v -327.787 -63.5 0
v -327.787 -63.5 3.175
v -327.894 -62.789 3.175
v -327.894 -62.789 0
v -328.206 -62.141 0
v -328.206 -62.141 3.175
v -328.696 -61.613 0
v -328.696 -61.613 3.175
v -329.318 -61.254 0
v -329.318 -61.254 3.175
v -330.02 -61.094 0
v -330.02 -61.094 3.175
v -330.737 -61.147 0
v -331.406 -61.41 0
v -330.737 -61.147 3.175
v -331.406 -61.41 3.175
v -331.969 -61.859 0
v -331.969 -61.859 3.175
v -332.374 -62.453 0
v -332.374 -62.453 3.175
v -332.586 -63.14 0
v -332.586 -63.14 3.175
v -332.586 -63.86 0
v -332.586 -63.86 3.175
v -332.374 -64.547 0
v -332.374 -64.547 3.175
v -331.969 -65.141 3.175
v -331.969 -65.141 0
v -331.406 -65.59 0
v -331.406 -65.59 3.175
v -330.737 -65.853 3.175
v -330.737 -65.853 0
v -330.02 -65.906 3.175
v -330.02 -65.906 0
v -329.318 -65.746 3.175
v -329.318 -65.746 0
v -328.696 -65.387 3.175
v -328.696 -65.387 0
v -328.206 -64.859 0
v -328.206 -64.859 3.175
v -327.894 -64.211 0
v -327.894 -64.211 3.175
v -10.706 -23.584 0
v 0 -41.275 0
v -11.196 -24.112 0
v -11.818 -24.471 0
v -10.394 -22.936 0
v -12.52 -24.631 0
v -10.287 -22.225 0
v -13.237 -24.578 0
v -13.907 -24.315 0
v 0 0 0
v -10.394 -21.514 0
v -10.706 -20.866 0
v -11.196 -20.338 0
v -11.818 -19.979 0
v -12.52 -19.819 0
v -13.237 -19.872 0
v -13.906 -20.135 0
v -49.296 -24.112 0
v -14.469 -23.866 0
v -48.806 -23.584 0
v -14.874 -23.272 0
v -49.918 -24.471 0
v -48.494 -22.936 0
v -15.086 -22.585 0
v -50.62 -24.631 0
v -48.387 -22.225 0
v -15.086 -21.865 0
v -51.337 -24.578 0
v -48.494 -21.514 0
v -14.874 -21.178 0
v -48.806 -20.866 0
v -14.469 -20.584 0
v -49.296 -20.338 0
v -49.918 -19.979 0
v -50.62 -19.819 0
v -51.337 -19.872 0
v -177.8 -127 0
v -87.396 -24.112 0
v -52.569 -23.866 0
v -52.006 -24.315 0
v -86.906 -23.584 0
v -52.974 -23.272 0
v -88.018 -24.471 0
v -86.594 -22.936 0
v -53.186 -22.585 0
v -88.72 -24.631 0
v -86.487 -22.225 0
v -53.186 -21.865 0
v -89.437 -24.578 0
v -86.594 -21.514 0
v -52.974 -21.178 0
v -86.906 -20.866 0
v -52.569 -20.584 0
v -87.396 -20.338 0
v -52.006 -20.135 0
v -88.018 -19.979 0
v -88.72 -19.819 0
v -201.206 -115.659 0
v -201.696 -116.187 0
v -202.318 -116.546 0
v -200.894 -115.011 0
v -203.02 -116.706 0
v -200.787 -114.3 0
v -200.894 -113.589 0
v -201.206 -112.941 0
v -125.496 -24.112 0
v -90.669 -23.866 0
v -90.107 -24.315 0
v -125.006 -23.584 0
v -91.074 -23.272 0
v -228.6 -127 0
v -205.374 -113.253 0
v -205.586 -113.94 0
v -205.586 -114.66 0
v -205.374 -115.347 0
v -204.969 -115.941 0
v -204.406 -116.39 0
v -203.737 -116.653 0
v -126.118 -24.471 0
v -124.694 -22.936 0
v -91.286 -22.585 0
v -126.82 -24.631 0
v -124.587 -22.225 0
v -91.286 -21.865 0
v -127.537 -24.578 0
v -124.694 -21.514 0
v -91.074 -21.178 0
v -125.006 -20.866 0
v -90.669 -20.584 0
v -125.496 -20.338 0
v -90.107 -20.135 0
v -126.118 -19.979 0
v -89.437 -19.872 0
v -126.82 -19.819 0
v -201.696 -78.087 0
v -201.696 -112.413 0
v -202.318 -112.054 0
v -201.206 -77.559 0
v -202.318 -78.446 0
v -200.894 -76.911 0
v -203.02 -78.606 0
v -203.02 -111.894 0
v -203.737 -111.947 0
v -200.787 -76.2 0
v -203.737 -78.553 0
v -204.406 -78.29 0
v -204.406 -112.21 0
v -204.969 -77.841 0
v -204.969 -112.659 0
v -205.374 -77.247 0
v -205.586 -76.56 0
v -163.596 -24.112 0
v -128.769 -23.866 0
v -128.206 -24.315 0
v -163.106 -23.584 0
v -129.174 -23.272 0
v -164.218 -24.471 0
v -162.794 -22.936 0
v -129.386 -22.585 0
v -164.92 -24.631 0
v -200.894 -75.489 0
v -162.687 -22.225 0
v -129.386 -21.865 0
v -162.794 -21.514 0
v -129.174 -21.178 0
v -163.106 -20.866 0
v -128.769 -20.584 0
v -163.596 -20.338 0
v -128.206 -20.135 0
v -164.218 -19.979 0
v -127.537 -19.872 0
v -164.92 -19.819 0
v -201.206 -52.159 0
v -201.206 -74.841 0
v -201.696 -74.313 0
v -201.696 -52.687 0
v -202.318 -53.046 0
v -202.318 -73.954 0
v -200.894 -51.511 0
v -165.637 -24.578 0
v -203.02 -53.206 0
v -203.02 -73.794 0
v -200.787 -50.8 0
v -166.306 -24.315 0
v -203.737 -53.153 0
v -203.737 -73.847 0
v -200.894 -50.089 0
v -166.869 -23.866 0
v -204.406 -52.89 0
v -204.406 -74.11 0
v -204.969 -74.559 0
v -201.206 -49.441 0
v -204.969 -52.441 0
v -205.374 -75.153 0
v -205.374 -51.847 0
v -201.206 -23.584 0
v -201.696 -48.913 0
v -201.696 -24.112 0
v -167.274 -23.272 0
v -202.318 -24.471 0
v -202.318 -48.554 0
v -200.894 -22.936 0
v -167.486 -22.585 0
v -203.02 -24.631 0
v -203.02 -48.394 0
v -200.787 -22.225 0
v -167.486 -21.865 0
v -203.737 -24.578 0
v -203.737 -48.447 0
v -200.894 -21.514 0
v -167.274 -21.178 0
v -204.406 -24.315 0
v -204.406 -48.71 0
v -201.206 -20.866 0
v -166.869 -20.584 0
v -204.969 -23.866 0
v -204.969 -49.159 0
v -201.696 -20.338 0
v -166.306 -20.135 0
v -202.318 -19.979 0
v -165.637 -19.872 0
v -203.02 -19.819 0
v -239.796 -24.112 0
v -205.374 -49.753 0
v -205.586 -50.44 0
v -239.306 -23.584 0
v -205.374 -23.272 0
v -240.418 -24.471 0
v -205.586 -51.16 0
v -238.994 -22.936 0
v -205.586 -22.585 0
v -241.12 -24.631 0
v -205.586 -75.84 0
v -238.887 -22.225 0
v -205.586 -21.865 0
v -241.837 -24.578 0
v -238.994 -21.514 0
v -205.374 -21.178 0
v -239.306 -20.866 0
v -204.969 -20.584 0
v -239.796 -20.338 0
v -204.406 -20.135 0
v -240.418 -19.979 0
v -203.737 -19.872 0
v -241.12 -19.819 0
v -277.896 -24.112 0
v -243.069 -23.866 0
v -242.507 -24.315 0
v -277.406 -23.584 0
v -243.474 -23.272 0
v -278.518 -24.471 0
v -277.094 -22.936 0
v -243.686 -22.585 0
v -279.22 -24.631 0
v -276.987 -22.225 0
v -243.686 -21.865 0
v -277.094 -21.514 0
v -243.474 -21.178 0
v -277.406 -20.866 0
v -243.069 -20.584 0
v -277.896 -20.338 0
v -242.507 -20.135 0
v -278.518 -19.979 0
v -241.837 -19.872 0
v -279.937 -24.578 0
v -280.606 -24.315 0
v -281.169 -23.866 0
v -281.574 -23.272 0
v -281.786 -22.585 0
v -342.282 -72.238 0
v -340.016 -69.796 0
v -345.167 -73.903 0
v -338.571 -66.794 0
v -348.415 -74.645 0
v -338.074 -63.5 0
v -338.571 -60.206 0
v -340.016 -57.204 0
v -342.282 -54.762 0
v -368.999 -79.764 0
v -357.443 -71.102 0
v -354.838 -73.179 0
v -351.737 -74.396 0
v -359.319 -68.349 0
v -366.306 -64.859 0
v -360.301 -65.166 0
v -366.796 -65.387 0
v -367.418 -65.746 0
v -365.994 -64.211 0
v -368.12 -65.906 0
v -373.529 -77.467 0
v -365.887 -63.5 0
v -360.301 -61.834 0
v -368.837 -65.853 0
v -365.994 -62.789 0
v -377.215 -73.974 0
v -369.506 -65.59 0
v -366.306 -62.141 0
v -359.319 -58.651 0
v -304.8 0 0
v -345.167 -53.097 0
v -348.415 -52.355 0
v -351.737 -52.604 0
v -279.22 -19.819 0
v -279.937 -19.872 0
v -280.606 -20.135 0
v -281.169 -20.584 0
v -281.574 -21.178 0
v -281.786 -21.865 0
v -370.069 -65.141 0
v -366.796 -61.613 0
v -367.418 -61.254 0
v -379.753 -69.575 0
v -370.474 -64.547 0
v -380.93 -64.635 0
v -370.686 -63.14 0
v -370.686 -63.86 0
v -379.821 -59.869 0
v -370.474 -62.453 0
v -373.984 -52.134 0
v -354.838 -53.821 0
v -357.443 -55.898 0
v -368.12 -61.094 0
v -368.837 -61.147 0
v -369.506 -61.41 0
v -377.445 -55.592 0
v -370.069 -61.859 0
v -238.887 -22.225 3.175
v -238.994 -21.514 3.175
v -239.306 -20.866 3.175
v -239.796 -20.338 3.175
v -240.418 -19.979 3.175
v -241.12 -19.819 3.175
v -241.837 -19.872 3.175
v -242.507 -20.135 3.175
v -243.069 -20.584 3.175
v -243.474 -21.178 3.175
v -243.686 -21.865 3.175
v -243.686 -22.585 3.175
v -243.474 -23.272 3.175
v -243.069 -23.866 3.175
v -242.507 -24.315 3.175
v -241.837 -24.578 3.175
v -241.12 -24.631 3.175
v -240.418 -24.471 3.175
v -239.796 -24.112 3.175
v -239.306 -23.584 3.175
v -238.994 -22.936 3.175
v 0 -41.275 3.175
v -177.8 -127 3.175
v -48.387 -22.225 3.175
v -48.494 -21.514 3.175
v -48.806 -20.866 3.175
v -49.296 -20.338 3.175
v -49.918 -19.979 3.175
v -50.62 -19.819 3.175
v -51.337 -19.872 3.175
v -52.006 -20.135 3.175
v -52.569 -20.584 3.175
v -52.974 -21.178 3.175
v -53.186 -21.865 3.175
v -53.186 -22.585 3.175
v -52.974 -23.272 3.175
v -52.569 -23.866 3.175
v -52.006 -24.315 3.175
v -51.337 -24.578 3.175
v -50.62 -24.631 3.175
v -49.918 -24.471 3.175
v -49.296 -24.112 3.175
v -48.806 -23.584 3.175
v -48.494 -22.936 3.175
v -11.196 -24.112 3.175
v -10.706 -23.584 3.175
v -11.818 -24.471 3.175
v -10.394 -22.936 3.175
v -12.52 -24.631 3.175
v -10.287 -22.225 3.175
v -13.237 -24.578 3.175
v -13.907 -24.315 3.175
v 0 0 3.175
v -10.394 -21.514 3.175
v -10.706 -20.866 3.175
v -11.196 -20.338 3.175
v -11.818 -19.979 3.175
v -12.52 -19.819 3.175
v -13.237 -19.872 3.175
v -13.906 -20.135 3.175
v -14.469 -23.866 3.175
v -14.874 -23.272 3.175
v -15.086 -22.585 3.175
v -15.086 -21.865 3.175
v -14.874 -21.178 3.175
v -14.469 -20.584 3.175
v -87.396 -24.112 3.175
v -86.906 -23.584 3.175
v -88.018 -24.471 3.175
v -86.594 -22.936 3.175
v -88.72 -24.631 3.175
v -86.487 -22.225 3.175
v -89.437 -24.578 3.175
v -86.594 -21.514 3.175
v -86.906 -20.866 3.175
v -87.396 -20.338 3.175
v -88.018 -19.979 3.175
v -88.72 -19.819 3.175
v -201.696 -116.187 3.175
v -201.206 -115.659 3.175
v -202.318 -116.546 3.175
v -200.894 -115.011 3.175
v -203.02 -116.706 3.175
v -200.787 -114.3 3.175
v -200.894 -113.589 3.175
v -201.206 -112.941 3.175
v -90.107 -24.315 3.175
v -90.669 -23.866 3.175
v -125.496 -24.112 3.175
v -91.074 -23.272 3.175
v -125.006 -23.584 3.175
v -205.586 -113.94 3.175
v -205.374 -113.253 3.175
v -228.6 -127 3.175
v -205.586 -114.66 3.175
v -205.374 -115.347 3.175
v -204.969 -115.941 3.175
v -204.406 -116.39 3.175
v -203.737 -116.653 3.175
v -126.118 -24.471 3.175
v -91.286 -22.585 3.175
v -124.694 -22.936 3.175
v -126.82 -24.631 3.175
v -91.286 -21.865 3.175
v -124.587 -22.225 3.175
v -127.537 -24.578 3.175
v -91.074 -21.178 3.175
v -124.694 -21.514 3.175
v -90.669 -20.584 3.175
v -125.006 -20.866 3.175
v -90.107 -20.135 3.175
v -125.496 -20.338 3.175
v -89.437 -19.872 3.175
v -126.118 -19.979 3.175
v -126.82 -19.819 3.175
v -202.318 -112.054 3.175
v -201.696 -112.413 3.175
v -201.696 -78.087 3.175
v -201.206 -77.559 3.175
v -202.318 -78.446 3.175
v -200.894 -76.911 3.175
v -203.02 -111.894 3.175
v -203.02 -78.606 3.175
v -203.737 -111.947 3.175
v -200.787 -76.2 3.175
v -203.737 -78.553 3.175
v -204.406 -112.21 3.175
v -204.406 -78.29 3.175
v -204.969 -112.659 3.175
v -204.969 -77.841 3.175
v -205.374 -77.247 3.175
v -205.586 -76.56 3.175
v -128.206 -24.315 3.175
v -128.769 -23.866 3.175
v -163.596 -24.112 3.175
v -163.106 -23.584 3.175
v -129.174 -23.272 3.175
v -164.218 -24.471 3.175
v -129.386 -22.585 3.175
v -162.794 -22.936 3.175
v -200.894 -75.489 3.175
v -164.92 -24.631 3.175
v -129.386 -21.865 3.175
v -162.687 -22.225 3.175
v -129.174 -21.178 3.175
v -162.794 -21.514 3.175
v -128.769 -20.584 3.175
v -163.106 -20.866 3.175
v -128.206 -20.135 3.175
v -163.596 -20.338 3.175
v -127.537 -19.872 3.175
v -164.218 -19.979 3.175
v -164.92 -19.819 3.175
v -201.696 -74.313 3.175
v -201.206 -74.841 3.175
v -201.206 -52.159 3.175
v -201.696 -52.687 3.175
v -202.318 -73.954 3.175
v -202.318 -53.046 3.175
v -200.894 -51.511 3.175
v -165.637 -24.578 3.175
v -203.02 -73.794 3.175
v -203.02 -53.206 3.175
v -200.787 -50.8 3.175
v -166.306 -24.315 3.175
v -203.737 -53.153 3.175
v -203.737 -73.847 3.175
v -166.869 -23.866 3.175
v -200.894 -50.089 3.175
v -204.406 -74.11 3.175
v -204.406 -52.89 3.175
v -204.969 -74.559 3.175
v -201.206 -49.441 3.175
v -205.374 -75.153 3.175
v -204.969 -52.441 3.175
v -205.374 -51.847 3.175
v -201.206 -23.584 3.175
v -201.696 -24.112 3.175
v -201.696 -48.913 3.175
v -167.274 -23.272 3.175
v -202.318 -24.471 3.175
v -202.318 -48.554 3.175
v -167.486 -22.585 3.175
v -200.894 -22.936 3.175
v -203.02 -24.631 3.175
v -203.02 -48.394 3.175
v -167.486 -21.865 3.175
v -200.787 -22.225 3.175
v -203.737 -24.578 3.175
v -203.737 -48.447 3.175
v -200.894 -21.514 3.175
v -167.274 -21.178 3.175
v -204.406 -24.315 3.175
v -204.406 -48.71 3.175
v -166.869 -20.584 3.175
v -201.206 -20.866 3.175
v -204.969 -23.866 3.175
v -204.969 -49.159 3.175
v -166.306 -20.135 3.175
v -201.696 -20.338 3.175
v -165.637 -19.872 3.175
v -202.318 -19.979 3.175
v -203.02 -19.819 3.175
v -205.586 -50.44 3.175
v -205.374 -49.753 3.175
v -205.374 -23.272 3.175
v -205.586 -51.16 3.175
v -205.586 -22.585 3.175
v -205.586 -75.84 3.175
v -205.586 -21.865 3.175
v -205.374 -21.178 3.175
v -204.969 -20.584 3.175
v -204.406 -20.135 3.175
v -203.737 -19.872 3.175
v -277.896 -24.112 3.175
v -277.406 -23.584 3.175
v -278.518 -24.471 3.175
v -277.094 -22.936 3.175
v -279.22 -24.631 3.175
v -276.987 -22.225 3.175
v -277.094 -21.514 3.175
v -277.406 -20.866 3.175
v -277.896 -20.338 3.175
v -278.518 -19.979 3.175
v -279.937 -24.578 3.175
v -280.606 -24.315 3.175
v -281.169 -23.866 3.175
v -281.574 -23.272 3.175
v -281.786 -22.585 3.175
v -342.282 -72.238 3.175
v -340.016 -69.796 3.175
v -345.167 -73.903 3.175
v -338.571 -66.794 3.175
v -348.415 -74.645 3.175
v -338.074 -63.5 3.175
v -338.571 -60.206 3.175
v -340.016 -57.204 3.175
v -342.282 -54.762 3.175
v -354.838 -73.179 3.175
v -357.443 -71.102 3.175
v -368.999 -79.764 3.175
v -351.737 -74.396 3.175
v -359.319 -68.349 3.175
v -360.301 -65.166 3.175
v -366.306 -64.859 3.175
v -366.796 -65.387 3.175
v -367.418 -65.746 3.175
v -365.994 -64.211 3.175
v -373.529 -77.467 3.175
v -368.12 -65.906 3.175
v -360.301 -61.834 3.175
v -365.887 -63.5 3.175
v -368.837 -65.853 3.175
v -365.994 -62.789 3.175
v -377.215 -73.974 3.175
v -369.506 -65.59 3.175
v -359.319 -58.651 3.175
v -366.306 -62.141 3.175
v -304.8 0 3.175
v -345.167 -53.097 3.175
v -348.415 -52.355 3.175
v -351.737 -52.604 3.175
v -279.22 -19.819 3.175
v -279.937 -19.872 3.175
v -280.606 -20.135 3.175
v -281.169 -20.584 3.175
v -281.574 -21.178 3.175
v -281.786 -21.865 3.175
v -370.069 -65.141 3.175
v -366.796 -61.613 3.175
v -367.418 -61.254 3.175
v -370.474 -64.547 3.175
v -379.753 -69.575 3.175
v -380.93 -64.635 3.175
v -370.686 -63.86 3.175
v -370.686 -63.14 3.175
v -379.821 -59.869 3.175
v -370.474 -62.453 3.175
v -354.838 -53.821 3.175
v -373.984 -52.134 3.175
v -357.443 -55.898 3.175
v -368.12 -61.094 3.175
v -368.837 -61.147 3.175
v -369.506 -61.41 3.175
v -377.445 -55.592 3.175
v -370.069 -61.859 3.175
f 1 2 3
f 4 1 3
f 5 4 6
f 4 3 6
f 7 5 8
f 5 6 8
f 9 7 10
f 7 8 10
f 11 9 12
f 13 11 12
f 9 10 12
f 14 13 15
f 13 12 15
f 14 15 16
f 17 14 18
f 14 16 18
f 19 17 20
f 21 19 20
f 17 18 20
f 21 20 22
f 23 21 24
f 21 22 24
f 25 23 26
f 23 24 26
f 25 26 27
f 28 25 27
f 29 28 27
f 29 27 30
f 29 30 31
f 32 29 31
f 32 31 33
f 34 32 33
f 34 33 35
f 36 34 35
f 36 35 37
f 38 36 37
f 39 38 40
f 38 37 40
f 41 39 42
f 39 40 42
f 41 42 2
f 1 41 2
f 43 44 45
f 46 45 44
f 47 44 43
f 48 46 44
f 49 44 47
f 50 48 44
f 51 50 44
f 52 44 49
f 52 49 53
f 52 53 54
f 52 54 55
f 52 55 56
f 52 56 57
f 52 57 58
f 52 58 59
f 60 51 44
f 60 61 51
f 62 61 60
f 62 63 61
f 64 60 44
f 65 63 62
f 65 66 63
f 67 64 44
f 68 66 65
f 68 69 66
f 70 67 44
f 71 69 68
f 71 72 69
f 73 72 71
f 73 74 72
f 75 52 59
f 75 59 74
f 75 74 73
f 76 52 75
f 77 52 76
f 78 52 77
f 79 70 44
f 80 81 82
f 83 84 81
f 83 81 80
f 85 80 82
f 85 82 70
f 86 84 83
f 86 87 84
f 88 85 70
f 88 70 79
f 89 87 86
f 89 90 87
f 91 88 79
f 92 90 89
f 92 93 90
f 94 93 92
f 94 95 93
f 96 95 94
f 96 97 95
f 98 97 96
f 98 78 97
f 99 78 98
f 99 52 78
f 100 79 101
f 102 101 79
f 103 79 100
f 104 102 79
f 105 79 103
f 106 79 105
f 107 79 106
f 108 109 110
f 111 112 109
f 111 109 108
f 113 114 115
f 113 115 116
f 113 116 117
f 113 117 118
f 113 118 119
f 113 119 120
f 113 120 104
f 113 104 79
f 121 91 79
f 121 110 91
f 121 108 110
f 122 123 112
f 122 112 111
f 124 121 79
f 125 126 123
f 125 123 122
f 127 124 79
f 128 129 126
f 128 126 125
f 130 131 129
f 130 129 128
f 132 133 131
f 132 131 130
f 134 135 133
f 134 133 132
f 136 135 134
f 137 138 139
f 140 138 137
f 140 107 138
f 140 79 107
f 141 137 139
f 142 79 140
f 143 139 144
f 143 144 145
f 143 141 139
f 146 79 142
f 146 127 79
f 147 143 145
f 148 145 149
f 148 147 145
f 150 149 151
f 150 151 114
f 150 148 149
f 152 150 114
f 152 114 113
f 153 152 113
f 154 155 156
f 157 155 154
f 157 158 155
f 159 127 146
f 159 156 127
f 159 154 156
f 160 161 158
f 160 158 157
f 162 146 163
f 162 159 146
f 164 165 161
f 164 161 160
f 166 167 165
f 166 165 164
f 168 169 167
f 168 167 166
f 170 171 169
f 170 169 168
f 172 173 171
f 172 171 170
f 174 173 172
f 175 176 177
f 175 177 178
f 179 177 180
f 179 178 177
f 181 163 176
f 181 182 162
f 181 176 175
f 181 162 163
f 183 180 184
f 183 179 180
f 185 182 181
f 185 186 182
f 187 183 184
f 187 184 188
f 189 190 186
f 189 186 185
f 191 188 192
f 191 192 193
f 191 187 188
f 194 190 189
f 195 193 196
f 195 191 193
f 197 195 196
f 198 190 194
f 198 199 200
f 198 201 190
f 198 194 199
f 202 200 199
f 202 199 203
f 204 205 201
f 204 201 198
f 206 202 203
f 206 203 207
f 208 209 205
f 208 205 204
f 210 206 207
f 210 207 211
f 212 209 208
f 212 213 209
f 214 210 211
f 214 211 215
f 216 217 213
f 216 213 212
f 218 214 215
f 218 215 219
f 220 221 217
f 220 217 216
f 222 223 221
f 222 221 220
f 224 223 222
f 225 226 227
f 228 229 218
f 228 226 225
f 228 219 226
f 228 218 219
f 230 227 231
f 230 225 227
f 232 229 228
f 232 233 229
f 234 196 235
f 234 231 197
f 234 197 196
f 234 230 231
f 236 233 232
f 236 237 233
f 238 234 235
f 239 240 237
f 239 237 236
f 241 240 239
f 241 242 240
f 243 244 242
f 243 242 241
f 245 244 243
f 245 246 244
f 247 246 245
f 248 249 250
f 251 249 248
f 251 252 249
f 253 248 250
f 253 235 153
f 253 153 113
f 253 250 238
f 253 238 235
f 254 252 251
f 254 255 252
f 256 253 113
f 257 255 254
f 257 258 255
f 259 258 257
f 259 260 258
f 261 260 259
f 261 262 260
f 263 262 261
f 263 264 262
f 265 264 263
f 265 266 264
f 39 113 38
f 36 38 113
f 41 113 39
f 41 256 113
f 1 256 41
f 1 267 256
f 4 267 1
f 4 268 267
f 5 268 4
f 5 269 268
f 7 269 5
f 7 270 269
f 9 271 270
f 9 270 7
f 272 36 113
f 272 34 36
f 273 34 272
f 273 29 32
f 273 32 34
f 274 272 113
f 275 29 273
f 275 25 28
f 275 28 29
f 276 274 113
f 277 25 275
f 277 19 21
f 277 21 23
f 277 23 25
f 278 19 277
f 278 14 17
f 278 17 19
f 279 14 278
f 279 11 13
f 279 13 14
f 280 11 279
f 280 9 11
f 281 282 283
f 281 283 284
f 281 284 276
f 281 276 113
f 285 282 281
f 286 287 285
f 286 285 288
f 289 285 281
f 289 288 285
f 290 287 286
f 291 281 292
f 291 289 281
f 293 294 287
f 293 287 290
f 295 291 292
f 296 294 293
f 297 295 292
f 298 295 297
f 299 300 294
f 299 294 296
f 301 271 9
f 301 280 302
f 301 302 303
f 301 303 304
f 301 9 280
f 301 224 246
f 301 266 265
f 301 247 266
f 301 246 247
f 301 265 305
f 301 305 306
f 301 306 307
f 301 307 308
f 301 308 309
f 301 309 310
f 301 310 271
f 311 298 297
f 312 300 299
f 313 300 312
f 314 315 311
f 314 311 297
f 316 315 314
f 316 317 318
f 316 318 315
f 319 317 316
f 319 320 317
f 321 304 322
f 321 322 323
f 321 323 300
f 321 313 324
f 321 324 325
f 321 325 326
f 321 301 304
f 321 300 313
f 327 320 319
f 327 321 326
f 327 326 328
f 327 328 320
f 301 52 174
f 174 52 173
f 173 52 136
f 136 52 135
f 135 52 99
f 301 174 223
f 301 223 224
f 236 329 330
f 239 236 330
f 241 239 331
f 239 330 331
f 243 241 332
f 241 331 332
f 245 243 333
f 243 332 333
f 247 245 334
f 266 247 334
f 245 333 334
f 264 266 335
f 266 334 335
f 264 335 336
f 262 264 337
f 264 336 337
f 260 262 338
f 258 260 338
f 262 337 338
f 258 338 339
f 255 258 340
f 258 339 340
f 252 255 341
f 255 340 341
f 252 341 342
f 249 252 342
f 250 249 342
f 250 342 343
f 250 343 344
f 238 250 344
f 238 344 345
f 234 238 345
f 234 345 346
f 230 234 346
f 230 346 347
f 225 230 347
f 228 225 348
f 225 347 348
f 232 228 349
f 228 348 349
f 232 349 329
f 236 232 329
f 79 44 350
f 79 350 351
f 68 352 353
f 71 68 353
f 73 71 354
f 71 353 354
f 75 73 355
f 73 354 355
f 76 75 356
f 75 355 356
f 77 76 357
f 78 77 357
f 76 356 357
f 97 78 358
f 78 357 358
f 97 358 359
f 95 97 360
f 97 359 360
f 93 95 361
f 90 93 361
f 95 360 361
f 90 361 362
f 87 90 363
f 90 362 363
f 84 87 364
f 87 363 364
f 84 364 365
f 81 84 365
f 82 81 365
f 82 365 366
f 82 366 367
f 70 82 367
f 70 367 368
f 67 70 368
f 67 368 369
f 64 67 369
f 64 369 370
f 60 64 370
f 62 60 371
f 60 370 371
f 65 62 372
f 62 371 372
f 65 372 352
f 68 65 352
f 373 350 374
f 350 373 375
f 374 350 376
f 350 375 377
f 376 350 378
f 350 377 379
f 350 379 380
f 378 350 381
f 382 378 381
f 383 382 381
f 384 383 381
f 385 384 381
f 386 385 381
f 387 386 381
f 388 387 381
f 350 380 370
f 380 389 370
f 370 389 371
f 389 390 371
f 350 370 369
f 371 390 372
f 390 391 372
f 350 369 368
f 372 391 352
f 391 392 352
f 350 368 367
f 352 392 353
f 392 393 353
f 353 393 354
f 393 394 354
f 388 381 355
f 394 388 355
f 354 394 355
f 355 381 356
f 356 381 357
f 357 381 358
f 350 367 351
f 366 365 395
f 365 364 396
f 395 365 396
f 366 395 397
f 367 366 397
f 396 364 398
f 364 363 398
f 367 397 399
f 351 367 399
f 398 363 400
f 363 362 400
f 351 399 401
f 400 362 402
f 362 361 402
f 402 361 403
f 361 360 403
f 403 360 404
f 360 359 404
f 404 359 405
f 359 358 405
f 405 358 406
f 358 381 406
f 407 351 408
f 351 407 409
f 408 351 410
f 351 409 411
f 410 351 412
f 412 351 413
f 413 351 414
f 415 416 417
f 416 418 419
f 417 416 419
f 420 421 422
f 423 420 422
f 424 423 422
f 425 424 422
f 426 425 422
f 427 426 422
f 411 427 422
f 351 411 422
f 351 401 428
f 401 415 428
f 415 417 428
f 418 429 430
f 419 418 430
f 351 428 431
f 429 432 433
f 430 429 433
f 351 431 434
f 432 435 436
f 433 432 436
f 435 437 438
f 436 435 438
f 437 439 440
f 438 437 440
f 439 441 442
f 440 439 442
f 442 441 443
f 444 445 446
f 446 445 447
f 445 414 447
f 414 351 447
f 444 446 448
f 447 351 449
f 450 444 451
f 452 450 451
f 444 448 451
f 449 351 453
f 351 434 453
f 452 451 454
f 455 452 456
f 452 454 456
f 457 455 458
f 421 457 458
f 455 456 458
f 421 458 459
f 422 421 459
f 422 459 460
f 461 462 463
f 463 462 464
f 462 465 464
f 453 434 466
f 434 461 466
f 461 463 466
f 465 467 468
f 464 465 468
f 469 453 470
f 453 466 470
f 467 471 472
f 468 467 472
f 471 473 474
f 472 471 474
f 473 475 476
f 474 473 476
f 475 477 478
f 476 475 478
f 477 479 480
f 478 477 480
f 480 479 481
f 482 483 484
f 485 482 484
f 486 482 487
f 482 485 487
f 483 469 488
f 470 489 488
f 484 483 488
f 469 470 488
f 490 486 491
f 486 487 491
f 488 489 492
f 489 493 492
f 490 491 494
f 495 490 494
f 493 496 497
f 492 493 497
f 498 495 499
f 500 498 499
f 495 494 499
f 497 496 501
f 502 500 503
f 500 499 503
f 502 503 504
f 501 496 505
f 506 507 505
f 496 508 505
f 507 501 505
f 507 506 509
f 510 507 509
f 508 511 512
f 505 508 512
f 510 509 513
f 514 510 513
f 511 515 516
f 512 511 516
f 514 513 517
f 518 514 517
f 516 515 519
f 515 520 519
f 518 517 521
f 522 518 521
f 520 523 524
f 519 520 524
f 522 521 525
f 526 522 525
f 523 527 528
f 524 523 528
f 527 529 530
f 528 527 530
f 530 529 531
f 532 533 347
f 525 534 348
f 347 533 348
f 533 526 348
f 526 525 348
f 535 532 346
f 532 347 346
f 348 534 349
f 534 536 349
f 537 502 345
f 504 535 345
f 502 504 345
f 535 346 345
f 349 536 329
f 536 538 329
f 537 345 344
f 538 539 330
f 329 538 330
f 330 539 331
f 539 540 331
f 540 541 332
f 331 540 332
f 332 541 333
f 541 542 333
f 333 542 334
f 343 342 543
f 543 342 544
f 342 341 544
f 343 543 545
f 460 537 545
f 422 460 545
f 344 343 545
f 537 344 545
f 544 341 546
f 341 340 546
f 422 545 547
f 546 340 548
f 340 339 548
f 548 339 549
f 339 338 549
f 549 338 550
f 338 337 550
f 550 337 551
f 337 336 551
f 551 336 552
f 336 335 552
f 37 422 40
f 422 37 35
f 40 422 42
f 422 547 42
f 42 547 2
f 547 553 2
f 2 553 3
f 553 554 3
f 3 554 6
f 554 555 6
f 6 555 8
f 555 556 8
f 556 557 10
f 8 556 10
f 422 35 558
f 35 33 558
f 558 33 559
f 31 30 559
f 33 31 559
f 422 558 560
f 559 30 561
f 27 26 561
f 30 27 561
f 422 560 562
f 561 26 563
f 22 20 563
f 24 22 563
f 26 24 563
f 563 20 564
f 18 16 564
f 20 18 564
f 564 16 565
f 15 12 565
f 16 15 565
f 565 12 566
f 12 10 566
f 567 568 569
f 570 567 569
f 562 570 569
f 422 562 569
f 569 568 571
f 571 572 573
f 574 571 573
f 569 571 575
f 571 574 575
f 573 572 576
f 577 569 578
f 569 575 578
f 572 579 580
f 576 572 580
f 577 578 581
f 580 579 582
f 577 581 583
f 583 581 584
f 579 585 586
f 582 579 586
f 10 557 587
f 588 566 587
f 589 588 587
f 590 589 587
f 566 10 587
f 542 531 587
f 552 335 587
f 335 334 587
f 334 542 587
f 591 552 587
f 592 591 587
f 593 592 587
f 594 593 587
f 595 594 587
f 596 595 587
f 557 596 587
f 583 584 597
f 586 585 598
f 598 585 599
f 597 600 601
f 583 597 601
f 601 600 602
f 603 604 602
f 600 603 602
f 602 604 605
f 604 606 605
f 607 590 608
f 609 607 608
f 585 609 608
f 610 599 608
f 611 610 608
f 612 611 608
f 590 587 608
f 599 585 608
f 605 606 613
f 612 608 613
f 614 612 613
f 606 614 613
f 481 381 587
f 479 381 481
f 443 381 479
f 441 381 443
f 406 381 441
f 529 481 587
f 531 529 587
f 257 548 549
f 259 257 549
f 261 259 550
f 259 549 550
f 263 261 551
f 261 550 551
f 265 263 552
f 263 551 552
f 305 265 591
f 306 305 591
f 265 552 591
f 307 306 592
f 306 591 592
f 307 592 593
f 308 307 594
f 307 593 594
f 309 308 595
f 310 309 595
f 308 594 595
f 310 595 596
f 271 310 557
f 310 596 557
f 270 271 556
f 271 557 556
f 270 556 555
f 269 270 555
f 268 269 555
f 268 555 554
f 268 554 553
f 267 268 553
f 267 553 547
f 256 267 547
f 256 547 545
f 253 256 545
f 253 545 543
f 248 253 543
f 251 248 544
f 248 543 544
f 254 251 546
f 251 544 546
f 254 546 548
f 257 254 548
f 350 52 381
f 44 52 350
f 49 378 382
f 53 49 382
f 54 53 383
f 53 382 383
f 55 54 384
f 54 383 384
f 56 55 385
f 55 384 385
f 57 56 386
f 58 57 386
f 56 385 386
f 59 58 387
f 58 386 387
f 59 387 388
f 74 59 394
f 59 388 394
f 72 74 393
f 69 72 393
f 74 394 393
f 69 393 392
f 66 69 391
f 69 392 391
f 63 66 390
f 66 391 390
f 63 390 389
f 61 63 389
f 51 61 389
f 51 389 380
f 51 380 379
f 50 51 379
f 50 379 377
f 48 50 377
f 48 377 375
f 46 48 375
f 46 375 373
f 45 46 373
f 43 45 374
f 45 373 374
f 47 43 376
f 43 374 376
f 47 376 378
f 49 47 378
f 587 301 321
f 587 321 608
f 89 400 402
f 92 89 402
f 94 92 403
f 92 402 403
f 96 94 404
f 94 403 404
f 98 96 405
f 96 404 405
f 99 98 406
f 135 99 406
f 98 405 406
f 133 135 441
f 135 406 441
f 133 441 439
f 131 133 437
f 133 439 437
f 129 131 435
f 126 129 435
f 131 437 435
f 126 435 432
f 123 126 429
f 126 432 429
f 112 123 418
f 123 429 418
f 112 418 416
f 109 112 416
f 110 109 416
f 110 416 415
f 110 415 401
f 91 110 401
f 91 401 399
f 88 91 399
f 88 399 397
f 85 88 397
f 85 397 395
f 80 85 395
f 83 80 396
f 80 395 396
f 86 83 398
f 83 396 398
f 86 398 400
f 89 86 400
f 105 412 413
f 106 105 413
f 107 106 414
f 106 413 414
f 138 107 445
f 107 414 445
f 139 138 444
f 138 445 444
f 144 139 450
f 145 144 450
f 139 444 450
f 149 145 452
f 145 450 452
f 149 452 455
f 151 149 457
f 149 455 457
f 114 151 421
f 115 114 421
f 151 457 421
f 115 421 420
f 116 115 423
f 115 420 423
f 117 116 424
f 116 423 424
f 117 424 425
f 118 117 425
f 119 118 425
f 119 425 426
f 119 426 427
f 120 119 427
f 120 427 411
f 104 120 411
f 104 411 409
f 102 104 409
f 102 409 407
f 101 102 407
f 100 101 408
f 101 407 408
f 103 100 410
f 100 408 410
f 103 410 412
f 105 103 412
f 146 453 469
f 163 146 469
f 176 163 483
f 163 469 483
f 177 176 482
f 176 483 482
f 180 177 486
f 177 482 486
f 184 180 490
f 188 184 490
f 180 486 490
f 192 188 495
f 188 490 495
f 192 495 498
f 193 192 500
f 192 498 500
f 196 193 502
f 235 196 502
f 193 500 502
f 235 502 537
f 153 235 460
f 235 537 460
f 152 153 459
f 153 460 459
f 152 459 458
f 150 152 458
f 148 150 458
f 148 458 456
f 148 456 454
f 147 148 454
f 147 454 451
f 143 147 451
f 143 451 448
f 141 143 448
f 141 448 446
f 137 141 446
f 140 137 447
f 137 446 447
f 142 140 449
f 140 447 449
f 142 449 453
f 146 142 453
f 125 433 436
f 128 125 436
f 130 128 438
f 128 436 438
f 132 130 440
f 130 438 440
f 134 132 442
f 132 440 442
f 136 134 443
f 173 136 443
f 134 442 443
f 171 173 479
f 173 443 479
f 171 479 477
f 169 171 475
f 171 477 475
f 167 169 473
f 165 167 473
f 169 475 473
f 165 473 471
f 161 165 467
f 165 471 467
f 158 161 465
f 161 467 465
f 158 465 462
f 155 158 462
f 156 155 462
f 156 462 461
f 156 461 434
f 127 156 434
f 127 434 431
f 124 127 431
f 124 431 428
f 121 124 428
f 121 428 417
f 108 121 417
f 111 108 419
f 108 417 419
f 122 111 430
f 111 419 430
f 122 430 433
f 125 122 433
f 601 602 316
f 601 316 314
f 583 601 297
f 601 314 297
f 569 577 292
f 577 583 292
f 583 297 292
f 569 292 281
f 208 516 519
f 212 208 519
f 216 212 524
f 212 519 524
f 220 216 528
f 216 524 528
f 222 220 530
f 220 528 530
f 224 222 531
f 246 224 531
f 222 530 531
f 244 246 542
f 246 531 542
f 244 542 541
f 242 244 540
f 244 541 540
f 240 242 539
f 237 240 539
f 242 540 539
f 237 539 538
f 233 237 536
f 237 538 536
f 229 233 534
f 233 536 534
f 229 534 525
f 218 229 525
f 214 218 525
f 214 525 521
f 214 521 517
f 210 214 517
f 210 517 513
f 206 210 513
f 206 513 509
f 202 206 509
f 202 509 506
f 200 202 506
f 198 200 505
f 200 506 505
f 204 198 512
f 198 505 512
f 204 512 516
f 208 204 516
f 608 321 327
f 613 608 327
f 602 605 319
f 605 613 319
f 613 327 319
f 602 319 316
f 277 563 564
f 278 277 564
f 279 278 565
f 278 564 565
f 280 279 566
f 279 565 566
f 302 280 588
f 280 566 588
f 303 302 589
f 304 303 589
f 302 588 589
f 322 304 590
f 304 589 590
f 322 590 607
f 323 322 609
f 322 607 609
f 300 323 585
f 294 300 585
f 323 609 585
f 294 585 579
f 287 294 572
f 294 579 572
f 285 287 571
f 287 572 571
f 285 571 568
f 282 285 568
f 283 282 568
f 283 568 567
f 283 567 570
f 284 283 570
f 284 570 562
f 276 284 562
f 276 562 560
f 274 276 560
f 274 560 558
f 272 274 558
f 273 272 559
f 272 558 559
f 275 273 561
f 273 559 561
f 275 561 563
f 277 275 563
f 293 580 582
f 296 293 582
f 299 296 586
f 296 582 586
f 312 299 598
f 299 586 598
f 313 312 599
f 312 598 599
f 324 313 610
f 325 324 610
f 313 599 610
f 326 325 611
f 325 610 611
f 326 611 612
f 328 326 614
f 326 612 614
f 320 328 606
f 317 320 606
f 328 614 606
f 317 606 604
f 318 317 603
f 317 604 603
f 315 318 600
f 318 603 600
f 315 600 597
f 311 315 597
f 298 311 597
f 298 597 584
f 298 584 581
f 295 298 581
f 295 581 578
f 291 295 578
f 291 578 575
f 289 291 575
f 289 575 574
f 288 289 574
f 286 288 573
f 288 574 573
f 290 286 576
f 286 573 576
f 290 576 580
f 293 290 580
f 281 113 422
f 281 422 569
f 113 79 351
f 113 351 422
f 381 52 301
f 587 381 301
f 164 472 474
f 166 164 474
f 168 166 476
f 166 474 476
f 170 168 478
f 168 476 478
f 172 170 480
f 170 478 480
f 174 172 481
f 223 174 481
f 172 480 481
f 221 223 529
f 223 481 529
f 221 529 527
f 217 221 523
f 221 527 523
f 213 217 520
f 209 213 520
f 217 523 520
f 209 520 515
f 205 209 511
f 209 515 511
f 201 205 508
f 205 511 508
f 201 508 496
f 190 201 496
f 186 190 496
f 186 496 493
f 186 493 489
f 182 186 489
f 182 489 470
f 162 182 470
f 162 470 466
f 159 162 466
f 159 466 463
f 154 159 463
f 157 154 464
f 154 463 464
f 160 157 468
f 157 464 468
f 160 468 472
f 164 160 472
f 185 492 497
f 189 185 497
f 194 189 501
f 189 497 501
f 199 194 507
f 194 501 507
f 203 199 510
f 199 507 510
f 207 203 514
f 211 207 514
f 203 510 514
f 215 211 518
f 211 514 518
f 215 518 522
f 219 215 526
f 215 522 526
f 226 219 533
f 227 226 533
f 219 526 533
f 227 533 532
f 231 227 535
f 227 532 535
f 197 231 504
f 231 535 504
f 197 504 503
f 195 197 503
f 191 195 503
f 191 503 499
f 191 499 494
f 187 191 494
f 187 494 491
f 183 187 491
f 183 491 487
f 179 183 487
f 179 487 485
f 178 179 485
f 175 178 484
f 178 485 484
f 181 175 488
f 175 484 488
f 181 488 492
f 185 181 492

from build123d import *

# Parameters (mm, degrees)
BOSS_EXTRUDE1_DEPTH = 3.175
SKETCH2_R           = 11.176
SKETCH2_R_2         = 2.413
CUT_EXTRUDE1_DEPTH  = 3.175
CHAMFER2_SIZE       = 76.2
CHAMFER2_SIZE2      = 57.420818618
FILLET2_R           = 17.62
SKETCH3_R           = 2.413
CUT_EXTRUDE2_DEPTH  = 3.175


with BuildPart() as part:
    # Sketch1 → Boss-Extrude1 (new body)
    with BuildSketch(Plane.XY):
        Polygon((-304.8, 0), (0, 0), (0, -41.275), (-177.8, -127), (-228.6, -127), (-381, -75.7257486), (-381, 0), align=None)
    extrude(amount=BOSS_EXTRUDE1_DEPTH)

    # Sketch2 → Cut-Extrude1 (cut)
    with BuildSketch(Plane.XY.offset(3.175)):
        with Locations((-349.25, -63.5)):
            Circle(SKETCH2_R)
        with Locations((-279.4, -22.225)):
            Circle(SKETCH2_R_2)
        with Locations((-241.3, -22.225)):
            Circle(SKETCH2_R_2)
        with Locations((-203.2, -22.225)):
            Circle(SKETCH2_R_2)
        with Locations((-203.2, -50.8)):
            Circle(SKETCH2_R_2)
        with Locations((-165.1, -22.225)):
            Circle(SKETCH2_R_2)
        with Locations((-127, -22.225)):
            Circle(SKETCH2_R_2)
        with Locations((-88.9, -22.225)):
            Circle(SKETCH2_R_2)
        with Locations((-12.7, -22.225)):
            Circle(SKETCH2_R_2)
        with Locations((-203.2, -76.2)):
            Circle(SKETCH2_R_2)
        with Locations((-203.2, -114.3)):
            Circle(SKETCH2_R_2)
        with Locations((-50.8, -22.225)):
            Circle(SKETCH2_R_2)
    extrude(amount=-CUT_EXTRUDE1_DEPTH, mode=Mode.SUBTRACT)

    # Chamfer2
    chamfer2_edges = [part.edges().sort_by_distance(p)[0] for p in [
        (-381, 0, 1.5875),
    ]]
    chamfer2_side = [part.faces().sort_by_distance(p)[0] for p in [
        (-190.5, 0, 1.5875),
    ]]
    chamfer(chamfer2_edges, length=CHAMFER2_SIZE, length2=CHAMFER2_SIZE2, reference=chamfer2_side[0])

    # Fillet2
    # the kernel refuses this fillet: 17.62 mm, written as the material it takes off along each edge
    with BuildSketch(Plane(origin=(-381, -75.7257486, -31.65589506), x_dir=(0, 1, 0), z_dir=(0, 0, 1))) as fillet2_piece_1:
        with BuildLine():
            CenterArc((FILLET2_R * 0.718635529169, -FILLET2_R), FILLET2_R, 90, 71.404733131)
            Line((-FILLET2_R * 0.22915922643, -FILLET2_R * 0.681118985733), (0, 0))
            Line((0, 0), (FILLET2_R * 0.718635529169, 0))
        make_face()
    extrude(amount=66.48679012, mode=Mode.SUBTRACT)
    with BuildSketch(Plane(origin=(-381, -57.420818618, -21.962519835), x_dir=(0.7986355100472917, 0.6018150231520498, 0), z_dir=(0, 0, 1))) as fillet2_piece_2:
        with BuildLine():
            CenterArc((FILLET2_R * 0.498581608053, -FILLET2_R), FILLET2_R, 90, 53)
            Line((-FILLET2_R * 0.300053901994, -FILLET2_R * 0.398184976848), (0, 0))
            Line((0, 0), (FILLET2_R * 0.498581608053, 0))
        make_face()
    extrude(amount=47.10003967, mode=Mode.SUBTRACT)

    # Sketch3 → Cut-Extrude2 (cut)
    with BuildSketch(Plane.XY.offset(3.175)):
        with Locations((-368.3, -63.5)):
            Circle(SKETCH3_R)
        with Locations((-330.2, -63.5)):
            Circle(SKETCH3_R)
    extrude(amount=-CUT_EXTRUDE2_DEPTH, mode=Mode.SUBTRACT)


solid = part.part
